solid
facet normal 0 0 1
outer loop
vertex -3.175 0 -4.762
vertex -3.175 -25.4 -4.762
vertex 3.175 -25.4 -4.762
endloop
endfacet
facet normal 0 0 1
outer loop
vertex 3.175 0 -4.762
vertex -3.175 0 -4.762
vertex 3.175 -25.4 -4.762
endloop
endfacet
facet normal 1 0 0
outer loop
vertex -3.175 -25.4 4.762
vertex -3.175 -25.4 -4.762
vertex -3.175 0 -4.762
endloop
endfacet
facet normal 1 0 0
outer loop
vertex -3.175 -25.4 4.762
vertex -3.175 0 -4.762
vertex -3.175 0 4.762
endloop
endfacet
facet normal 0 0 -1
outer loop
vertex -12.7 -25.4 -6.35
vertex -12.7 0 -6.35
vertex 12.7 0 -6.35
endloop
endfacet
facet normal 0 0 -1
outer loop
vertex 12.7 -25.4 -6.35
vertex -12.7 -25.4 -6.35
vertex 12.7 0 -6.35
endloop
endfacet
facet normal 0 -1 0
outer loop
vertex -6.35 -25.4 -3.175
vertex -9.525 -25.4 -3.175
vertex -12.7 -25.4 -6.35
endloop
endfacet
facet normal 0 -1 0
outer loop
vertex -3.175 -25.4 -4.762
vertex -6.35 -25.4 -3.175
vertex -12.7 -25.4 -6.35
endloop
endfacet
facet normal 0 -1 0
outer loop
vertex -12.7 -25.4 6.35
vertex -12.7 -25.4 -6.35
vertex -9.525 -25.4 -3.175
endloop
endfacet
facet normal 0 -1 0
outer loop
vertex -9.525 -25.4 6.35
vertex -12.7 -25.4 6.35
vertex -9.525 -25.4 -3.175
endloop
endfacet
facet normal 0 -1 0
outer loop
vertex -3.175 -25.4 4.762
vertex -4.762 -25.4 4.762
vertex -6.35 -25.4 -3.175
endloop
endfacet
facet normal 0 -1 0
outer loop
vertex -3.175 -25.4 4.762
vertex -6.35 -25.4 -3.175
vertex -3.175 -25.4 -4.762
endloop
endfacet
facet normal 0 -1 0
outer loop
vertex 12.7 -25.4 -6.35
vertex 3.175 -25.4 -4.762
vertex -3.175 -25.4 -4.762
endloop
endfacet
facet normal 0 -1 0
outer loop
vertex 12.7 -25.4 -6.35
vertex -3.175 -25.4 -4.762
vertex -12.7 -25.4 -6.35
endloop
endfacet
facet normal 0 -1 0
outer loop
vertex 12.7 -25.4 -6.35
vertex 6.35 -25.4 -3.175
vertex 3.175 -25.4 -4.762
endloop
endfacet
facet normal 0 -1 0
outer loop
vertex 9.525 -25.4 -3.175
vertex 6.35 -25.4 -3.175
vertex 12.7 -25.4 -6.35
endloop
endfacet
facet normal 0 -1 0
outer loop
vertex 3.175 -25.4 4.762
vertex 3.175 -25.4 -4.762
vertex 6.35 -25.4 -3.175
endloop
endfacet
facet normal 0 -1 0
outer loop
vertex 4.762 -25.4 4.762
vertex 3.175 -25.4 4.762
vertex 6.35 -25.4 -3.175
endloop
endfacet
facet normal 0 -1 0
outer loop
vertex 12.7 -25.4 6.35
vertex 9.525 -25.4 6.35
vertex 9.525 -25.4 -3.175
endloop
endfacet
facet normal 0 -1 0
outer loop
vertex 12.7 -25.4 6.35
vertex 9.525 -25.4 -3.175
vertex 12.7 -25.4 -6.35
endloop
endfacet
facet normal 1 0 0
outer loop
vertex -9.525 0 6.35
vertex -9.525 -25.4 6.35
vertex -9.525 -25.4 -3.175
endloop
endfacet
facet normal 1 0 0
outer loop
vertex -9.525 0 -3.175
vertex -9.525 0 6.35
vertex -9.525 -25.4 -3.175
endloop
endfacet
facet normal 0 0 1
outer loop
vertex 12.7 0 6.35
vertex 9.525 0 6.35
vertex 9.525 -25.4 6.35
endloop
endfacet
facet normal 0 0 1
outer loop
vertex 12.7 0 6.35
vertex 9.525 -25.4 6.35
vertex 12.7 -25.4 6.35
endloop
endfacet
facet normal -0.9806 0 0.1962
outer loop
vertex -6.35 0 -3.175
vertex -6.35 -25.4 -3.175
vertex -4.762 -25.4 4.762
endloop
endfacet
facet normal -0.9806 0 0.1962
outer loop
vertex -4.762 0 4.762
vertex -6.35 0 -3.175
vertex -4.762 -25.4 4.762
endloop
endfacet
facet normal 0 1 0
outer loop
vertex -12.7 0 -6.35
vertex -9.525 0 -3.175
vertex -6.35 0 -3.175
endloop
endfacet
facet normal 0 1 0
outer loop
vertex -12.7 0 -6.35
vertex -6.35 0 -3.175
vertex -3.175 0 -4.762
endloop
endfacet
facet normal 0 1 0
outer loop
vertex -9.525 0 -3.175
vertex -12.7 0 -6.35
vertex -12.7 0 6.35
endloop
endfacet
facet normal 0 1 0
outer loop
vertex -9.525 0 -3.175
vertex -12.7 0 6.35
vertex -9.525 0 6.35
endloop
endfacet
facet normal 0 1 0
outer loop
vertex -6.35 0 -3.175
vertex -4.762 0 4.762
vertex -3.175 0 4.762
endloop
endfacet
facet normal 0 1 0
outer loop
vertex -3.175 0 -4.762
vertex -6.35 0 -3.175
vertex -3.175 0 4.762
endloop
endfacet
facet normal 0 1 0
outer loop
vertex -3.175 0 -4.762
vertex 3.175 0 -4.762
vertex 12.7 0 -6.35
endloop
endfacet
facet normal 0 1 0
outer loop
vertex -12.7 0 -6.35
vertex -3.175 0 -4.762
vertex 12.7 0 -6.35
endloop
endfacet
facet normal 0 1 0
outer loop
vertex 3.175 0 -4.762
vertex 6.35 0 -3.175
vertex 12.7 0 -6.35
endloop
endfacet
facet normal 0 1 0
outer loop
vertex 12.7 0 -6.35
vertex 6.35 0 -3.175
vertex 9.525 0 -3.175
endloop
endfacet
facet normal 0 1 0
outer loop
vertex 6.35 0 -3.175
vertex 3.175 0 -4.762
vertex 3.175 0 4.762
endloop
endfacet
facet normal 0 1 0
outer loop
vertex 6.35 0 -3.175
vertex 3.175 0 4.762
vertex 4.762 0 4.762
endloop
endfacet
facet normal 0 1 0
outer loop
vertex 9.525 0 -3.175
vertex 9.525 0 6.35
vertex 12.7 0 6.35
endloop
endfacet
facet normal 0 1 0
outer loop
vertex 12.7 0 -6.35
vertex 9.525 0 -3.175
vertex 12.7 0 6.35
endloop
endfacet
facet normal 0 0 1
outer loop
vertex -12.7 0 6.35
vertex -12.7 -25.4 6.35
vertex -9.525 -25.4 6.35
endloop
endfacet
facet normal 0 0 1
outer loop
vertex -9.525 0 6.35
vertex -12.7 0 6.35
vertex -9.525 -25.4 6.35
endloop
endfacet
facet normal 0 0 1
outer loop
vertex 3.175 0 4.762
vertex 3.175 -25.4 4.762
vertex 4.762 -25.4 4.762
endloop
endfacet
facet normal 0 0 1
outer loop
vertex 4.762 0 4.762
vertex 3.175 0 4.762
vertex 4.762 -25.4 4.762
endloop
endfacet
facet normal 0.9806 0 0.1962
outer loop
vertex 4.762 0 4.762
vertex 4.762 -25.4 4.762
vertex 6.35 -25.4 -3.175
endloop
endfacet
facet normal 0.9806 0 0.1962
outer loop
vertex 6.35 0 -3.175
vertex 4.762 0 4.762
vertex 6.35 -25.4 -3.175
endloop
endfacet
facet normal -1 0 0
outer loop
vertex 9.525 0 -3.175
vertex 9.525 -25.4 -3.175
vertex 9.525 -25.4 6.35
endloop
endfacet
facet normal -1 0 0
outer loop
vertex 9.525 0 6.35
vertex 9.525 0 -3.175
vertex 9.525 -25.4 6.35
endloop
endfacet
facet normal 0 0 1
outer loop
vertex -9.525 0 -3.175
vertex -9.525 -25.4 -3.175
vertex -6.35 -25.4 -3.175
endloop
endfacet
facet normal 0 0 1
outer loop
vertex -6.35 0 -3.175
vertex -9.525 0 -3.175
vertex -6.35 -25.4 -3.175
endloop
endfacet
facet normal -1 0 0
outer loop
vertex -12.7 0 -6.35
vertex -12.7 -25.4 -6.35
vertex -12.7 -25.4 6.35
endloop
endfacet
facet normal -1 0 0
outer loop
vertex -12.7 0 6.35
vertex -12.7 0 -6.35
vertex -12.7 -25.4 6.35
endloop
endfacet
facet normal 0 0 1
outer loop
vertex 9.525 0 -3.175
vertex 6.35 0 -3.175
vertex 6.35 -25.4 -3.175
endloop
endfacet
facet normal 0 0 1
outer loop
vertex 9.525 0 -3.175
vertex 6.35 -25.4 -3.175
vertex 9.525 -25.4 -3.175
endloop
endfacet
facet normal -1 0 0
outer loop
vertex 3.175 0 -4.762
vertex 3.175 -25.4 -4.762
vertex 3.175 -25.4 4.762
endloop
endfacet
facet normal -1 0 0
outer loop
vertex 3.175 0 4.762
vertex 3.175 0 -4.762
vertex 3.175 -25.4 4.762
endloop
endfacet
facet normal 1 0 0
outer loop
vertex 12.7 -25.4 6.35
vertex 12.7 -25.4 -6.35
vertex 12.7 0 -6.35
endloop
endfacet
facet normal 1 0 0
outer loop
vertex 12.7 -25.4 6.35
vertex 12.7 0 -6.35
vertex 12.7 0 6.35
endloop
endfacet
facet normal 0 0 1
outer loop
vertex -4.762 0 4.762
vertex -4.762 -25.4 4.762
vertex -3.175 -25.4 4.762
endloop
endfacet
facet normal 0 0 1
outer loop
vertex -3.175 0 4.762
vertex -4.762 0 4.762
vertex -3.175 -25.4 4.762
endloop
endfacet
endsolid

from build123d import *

# Parameters (mm, degrees)
F0_W     = 25.4
F0_H     = 12.7
F1_DEPTH = 25.4
F2_W     = 6.35
F2_H     = 9.525
F3_DEPTH = 25.4
F5_DEPTH = 25.401


with BuildPart() as f1:
    # F0 (on Front) → F1 (new body)
    with BuildSketch(Plane.XZ):
        Rectangle(F0_W, F0_H)
    extrude(amount=F1_DEPTH)

    # F2 (on face) → F3 (cut)
    with BuildSketch(Plane.XZ.offset(25.4)):
        Rectangle(F2_W, F2_H)
    extrude(amount=-F3_DEPTH, mode=Mode.SUBTRACT)

    # F4 (on face) → F5 (cut, through all)
    with BuildSketch(Plane.XZ.offset(25.4)):
        Polygon((-4.7625, 4.7625), (-3.175, 4.7625), (3.175, 4.7625), (4.7625, 4.7625), (6.35, -3.175), (9.525, -3.175), (9.525, 6.35), (0, 6.35), (-9.525, 6.35), (-9.525, -3.175), (-6.35, -3.175), align=None)
    extrude(amount=-F5_DEPTH, mode=Mode.SUBTRACT)


solid = f1.part
